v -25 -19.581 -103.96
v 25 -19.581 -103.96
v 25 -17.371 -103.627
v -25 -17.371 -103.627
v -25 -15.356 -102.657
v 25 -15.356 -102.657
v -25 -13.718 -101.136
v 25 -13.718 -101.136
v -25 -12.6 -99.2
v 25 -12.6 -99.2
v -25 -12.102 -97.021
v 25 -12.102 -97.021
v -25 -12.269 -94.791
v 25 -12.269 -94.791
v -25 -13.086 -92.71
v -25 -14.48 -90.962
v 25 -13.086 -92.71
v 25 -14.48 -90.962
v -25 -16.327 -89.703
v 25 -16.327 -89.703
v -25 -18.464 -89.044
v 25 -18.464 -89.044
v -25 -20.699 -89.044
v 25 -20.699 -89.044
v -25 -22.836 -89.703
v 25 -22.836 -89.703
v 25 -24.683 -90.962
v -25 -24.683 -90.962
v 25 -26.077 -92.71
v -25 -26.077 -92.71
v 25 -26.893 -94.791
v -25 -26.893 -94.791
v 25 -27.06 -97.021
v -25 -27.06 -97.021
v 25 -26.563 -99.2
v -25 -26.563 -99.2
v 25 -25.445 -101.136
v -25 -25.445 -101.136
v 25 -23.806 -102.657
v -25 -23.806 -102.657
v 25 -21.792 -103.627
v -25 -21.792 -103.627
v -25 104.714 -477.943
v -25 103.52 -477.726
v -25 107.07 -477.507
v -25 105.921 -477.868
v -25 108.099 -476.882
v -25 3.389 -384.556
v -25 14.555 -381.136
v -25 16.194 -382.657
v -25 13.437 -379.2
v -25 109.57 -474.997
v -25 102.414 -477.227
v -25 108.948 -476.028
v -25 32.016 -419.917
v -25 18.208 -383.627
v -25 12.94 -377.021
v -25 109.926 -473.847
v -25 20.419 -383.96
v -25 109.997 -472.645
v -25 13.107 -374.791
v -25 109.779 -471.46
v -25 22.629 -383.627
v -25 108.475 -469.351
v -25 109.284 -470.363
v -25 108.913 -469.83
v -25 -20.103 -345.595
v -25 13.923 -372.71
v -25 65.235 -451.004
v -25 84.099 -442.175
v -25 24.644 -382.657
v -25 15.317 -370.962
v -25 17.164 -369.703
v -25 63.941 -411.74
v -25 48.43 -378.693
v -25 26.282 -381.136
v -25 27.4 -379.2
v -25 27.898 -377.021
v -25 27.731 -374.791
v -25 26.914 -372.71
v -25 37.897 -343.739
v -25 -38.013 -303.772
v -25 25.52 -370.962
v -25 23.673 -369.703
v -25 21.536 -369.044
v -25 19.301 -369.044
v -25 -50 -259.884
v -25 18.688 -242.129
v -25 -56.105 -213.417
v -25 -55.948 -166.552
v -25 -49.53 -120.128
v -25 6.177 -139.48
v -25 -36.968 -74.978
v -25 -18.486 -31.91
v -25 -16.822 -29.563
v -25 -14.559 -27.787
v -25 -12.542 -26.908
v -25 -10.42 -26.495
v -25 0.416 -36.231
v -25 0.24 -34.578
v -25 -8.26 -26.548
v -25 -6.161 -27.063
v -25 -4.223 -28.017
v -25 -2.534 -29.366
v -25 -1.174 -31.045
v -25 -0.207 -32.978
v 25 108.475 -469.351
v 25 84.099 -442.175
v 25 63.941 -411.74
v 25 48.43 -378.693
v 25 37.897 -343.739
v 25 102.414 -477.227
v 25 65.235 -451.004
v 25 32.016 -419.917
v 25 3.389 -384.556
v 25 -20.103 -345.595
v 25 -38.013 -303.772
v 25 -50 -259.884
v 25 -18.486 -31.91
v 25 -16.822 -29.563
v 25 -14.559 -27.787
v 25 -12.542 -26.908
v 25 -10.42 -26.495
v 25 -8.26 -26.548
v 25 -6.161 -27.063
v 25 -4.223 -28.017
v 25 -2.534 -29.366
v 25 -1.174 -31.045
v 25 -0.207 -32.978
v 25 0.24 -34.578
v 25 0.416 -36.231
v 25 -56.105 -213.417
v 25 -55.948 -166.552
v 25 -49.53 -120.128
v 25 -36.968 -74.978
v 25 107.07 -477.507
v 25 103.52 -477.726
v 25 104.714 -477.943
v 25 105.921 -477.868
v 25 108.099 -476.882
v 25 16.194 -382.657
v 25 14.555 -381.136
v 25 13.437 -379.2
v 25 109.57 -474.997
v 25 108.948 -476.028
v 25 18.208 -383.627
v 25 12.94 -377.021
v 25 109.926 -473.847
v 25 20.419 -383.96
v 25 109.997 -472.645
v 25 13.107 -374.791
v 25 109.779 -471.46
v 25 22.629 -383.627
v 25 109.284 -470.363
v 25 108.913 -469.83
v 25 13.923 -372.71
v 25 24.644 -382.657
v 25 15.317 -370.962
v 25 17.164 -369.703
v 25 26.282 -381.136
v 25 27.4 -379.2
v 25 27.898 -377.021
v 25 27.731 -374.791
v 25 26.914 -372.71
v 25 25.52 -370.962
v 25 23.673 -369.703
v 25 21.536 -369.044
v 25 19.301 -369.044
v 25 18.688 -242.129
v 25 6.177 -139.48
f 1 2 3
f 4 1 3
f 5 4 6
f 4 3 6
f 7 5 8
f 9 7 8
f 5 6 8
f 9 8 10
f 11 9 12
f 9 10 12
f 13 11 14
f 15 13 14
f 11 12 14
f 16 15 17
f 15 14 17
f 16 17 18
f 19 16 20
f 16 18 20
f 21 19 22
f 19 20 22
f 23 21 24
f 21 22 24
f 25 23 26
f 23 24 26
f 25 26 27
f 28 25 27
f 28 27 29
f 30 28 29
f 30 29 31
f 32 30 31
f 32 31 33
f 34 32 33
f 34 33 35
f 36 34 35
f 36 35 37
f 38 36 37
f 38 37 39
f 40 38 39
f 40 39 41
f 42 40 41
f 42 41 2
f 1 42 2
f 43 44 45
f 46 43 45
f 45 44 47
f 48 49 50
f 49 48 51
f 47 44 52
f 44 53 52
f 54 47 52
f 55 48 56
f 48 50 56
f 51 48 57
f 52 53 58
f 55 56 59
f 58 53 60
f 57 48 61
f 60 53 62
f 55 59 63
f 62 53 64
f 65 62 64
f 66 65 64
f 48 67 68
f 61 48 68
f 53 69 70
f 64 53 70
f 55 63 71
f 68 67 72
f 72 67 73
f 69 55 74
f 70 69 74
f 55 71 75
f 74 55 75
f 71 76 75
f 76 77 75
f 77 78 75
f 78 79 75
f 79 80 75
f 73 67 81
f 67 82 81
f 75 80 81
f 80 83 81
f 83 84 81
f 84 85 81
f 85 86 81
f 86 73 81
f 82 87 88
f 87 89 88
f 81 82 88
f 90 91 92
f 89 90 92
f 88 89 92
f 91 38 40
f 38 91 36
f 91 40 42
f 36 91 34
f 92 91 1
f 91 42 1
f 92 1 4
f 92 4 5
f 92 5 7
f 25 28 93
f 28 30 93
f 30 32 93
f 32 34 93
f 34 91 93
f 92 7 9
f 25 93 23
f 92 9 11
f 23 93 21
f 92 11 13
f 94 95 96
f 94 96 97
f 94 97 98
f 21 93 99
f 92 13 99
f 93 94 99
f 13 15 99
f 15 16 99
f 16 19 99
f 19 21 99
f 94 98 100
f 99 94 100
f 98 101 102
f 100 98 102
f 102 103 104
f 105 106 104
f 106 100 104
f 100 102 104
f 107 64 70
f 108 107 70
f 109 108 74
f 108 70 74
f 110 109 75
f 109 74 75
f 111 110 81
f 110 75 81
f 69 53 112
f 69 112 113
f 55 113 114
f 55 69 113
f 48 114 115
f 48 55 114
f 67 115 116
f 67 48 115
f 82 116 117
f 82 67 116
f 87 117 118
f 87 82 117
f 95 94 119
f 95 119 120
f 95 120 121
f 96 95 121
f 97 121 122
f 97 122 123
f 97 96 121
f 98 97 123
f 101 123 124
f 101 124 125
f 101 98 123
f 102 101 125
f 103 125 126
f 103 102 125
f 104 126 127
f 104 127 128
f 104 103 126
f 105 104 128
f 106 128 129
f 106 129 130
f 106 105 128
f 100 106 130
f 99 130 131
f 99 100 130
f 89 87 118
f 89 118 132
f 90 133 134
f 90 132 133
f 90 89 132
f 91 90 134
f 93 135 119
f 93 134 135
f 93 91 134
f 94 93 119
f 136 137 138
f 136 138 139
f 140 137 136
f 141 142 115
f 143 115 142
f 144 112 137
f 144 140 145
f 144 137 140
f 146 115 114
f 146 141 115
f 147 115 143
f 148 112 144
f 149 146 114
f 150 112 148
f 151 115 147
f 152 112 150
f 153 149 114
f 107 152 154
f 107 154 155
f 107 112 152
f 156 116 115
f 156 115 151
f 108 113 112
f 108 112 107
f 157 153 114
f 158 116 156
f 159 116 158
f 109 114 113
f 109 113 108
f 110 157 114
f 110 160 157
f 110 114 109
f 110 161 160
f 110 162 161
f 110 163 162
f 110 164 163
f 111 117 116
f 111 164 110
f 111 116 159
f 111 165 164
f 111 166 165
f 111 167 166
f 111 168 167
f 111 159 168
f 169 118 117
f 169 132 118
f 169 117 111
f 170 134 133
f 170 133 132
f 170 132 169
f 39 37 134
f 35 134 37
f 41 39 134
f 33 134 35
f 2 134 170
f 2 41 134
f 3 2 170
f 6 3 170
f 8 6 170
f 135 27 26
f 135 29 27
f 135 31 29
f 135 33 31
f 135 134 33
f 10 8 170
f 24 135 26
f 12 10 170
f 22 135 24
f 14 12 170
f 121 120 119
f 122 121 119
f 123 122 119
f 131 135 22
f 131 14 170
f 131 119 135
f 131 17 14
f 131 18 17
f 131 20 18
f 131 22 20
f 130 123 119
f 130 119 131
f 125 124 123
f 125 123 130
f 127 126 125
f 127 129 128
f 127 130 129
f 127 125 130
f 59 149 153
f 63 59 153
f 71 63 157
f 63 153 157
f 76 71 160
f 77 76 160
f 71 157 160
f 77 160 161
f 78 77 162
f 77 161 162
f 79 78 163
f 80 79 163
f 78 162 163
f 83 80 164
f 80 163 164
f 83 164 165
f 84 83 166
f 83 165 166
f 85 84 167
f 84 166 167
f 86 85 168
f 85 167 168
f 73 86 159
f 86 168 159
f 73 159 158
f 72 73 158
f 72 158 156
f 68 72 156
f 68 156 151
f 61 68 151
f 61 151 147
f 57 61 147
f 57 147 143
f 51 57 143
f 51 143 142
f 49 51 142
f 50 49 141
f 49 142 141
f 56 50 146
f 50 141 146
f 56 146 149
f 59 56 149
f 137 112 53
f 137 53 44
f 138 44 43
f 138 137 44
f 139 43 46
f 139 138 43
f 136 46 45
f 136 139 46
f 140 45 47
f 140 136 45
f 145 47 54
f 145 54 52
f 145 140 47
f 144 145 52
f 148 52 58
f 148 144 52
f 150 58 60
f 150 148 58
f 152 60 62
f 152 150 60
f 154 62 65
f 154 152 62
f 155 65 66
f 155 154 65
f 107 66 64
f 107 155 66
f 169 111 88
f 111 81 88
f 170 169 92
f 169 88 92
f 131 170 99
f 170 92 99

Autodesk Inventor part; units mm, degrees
ref_plane "YZ Plane" through (0, 0, 0) normal (1, 0, 0) x (0, 1, 0)
ref_plane "XZ Plane" through (0, 0, 0) normal (0, 1, 0) x (-1, 0, 0)
ref_plane "XY Plane" through (0, 0, 0) normal (0, 0, 1) x (1, 0, 0)
sketch "スケッチ1" plane through (0, 0, 0) normal (1, 0, 0) x (0, 1, 0)
  line L0 (0, 0) -> (147.3717, -500)
  arc A0 (0, 0) -> (37.8967, -343.7392) centre (1577.8776, 0) ccw
  arc A1 (37.8967, -343.7392) -> (147.3717, -500) centre (281.8923, -289.2769) ccw
  arc A2 (0, 0) -> (-50, -259.8835) centre (293.1864, -191.1589) ccw
  arc A3 (-50, -259.8835) -> (147.3717, -500) centre (273.5758, -195.086) ccw
  line L1 (0, -630.6128) -> (0, 110.8282) projected
  point P0 (35.1596, -247.5153)
  dimension "d1" = 500
  dimension "d2" = 250
  dimension "d3" = 1577.8776
  dimension "d4" = 250
  dimension "d6" = 350
  dimension "d21" = 330
  dimension "d26" = 50
extrude "押し出し1" add sketch "スケッチ1" along normal mid plane 50 contours L1 A3 A2 | A0 A1 A3 L1
fillet "フィレット1" radius 10 1 edges at (0, 0, 0)
fillet "フィレット1" radius 5 1 edges at (0, 147.3717, -500)
sketch "スケッチ2" plane through (25, 0, 0) normal (1, 0, 0) x (0, 0, -1)
  circle A0 centre (96.4602, -19.5814) radius 7.5
  circle A1 centre (376.4602, 20.4186) radius 7.5
  arc A2 (36.2306, 0.416) -> (31.9103, -18.4863) centre (36.4602, -9.5814) ccw projected
  point P0 (0, 0)
  dimension "d11" = 15
  dimension "d12" = 15
  dimension "d13" = 280
  dimension "d16" = 40
  dimension "d24" = 60
  dimension "d25" = 10
extrude "押し出し2" cut sketch "スケッチ2" against normal through all
properties part number "styro_50_main" material "ポリスチレン、耐衝撃性"
